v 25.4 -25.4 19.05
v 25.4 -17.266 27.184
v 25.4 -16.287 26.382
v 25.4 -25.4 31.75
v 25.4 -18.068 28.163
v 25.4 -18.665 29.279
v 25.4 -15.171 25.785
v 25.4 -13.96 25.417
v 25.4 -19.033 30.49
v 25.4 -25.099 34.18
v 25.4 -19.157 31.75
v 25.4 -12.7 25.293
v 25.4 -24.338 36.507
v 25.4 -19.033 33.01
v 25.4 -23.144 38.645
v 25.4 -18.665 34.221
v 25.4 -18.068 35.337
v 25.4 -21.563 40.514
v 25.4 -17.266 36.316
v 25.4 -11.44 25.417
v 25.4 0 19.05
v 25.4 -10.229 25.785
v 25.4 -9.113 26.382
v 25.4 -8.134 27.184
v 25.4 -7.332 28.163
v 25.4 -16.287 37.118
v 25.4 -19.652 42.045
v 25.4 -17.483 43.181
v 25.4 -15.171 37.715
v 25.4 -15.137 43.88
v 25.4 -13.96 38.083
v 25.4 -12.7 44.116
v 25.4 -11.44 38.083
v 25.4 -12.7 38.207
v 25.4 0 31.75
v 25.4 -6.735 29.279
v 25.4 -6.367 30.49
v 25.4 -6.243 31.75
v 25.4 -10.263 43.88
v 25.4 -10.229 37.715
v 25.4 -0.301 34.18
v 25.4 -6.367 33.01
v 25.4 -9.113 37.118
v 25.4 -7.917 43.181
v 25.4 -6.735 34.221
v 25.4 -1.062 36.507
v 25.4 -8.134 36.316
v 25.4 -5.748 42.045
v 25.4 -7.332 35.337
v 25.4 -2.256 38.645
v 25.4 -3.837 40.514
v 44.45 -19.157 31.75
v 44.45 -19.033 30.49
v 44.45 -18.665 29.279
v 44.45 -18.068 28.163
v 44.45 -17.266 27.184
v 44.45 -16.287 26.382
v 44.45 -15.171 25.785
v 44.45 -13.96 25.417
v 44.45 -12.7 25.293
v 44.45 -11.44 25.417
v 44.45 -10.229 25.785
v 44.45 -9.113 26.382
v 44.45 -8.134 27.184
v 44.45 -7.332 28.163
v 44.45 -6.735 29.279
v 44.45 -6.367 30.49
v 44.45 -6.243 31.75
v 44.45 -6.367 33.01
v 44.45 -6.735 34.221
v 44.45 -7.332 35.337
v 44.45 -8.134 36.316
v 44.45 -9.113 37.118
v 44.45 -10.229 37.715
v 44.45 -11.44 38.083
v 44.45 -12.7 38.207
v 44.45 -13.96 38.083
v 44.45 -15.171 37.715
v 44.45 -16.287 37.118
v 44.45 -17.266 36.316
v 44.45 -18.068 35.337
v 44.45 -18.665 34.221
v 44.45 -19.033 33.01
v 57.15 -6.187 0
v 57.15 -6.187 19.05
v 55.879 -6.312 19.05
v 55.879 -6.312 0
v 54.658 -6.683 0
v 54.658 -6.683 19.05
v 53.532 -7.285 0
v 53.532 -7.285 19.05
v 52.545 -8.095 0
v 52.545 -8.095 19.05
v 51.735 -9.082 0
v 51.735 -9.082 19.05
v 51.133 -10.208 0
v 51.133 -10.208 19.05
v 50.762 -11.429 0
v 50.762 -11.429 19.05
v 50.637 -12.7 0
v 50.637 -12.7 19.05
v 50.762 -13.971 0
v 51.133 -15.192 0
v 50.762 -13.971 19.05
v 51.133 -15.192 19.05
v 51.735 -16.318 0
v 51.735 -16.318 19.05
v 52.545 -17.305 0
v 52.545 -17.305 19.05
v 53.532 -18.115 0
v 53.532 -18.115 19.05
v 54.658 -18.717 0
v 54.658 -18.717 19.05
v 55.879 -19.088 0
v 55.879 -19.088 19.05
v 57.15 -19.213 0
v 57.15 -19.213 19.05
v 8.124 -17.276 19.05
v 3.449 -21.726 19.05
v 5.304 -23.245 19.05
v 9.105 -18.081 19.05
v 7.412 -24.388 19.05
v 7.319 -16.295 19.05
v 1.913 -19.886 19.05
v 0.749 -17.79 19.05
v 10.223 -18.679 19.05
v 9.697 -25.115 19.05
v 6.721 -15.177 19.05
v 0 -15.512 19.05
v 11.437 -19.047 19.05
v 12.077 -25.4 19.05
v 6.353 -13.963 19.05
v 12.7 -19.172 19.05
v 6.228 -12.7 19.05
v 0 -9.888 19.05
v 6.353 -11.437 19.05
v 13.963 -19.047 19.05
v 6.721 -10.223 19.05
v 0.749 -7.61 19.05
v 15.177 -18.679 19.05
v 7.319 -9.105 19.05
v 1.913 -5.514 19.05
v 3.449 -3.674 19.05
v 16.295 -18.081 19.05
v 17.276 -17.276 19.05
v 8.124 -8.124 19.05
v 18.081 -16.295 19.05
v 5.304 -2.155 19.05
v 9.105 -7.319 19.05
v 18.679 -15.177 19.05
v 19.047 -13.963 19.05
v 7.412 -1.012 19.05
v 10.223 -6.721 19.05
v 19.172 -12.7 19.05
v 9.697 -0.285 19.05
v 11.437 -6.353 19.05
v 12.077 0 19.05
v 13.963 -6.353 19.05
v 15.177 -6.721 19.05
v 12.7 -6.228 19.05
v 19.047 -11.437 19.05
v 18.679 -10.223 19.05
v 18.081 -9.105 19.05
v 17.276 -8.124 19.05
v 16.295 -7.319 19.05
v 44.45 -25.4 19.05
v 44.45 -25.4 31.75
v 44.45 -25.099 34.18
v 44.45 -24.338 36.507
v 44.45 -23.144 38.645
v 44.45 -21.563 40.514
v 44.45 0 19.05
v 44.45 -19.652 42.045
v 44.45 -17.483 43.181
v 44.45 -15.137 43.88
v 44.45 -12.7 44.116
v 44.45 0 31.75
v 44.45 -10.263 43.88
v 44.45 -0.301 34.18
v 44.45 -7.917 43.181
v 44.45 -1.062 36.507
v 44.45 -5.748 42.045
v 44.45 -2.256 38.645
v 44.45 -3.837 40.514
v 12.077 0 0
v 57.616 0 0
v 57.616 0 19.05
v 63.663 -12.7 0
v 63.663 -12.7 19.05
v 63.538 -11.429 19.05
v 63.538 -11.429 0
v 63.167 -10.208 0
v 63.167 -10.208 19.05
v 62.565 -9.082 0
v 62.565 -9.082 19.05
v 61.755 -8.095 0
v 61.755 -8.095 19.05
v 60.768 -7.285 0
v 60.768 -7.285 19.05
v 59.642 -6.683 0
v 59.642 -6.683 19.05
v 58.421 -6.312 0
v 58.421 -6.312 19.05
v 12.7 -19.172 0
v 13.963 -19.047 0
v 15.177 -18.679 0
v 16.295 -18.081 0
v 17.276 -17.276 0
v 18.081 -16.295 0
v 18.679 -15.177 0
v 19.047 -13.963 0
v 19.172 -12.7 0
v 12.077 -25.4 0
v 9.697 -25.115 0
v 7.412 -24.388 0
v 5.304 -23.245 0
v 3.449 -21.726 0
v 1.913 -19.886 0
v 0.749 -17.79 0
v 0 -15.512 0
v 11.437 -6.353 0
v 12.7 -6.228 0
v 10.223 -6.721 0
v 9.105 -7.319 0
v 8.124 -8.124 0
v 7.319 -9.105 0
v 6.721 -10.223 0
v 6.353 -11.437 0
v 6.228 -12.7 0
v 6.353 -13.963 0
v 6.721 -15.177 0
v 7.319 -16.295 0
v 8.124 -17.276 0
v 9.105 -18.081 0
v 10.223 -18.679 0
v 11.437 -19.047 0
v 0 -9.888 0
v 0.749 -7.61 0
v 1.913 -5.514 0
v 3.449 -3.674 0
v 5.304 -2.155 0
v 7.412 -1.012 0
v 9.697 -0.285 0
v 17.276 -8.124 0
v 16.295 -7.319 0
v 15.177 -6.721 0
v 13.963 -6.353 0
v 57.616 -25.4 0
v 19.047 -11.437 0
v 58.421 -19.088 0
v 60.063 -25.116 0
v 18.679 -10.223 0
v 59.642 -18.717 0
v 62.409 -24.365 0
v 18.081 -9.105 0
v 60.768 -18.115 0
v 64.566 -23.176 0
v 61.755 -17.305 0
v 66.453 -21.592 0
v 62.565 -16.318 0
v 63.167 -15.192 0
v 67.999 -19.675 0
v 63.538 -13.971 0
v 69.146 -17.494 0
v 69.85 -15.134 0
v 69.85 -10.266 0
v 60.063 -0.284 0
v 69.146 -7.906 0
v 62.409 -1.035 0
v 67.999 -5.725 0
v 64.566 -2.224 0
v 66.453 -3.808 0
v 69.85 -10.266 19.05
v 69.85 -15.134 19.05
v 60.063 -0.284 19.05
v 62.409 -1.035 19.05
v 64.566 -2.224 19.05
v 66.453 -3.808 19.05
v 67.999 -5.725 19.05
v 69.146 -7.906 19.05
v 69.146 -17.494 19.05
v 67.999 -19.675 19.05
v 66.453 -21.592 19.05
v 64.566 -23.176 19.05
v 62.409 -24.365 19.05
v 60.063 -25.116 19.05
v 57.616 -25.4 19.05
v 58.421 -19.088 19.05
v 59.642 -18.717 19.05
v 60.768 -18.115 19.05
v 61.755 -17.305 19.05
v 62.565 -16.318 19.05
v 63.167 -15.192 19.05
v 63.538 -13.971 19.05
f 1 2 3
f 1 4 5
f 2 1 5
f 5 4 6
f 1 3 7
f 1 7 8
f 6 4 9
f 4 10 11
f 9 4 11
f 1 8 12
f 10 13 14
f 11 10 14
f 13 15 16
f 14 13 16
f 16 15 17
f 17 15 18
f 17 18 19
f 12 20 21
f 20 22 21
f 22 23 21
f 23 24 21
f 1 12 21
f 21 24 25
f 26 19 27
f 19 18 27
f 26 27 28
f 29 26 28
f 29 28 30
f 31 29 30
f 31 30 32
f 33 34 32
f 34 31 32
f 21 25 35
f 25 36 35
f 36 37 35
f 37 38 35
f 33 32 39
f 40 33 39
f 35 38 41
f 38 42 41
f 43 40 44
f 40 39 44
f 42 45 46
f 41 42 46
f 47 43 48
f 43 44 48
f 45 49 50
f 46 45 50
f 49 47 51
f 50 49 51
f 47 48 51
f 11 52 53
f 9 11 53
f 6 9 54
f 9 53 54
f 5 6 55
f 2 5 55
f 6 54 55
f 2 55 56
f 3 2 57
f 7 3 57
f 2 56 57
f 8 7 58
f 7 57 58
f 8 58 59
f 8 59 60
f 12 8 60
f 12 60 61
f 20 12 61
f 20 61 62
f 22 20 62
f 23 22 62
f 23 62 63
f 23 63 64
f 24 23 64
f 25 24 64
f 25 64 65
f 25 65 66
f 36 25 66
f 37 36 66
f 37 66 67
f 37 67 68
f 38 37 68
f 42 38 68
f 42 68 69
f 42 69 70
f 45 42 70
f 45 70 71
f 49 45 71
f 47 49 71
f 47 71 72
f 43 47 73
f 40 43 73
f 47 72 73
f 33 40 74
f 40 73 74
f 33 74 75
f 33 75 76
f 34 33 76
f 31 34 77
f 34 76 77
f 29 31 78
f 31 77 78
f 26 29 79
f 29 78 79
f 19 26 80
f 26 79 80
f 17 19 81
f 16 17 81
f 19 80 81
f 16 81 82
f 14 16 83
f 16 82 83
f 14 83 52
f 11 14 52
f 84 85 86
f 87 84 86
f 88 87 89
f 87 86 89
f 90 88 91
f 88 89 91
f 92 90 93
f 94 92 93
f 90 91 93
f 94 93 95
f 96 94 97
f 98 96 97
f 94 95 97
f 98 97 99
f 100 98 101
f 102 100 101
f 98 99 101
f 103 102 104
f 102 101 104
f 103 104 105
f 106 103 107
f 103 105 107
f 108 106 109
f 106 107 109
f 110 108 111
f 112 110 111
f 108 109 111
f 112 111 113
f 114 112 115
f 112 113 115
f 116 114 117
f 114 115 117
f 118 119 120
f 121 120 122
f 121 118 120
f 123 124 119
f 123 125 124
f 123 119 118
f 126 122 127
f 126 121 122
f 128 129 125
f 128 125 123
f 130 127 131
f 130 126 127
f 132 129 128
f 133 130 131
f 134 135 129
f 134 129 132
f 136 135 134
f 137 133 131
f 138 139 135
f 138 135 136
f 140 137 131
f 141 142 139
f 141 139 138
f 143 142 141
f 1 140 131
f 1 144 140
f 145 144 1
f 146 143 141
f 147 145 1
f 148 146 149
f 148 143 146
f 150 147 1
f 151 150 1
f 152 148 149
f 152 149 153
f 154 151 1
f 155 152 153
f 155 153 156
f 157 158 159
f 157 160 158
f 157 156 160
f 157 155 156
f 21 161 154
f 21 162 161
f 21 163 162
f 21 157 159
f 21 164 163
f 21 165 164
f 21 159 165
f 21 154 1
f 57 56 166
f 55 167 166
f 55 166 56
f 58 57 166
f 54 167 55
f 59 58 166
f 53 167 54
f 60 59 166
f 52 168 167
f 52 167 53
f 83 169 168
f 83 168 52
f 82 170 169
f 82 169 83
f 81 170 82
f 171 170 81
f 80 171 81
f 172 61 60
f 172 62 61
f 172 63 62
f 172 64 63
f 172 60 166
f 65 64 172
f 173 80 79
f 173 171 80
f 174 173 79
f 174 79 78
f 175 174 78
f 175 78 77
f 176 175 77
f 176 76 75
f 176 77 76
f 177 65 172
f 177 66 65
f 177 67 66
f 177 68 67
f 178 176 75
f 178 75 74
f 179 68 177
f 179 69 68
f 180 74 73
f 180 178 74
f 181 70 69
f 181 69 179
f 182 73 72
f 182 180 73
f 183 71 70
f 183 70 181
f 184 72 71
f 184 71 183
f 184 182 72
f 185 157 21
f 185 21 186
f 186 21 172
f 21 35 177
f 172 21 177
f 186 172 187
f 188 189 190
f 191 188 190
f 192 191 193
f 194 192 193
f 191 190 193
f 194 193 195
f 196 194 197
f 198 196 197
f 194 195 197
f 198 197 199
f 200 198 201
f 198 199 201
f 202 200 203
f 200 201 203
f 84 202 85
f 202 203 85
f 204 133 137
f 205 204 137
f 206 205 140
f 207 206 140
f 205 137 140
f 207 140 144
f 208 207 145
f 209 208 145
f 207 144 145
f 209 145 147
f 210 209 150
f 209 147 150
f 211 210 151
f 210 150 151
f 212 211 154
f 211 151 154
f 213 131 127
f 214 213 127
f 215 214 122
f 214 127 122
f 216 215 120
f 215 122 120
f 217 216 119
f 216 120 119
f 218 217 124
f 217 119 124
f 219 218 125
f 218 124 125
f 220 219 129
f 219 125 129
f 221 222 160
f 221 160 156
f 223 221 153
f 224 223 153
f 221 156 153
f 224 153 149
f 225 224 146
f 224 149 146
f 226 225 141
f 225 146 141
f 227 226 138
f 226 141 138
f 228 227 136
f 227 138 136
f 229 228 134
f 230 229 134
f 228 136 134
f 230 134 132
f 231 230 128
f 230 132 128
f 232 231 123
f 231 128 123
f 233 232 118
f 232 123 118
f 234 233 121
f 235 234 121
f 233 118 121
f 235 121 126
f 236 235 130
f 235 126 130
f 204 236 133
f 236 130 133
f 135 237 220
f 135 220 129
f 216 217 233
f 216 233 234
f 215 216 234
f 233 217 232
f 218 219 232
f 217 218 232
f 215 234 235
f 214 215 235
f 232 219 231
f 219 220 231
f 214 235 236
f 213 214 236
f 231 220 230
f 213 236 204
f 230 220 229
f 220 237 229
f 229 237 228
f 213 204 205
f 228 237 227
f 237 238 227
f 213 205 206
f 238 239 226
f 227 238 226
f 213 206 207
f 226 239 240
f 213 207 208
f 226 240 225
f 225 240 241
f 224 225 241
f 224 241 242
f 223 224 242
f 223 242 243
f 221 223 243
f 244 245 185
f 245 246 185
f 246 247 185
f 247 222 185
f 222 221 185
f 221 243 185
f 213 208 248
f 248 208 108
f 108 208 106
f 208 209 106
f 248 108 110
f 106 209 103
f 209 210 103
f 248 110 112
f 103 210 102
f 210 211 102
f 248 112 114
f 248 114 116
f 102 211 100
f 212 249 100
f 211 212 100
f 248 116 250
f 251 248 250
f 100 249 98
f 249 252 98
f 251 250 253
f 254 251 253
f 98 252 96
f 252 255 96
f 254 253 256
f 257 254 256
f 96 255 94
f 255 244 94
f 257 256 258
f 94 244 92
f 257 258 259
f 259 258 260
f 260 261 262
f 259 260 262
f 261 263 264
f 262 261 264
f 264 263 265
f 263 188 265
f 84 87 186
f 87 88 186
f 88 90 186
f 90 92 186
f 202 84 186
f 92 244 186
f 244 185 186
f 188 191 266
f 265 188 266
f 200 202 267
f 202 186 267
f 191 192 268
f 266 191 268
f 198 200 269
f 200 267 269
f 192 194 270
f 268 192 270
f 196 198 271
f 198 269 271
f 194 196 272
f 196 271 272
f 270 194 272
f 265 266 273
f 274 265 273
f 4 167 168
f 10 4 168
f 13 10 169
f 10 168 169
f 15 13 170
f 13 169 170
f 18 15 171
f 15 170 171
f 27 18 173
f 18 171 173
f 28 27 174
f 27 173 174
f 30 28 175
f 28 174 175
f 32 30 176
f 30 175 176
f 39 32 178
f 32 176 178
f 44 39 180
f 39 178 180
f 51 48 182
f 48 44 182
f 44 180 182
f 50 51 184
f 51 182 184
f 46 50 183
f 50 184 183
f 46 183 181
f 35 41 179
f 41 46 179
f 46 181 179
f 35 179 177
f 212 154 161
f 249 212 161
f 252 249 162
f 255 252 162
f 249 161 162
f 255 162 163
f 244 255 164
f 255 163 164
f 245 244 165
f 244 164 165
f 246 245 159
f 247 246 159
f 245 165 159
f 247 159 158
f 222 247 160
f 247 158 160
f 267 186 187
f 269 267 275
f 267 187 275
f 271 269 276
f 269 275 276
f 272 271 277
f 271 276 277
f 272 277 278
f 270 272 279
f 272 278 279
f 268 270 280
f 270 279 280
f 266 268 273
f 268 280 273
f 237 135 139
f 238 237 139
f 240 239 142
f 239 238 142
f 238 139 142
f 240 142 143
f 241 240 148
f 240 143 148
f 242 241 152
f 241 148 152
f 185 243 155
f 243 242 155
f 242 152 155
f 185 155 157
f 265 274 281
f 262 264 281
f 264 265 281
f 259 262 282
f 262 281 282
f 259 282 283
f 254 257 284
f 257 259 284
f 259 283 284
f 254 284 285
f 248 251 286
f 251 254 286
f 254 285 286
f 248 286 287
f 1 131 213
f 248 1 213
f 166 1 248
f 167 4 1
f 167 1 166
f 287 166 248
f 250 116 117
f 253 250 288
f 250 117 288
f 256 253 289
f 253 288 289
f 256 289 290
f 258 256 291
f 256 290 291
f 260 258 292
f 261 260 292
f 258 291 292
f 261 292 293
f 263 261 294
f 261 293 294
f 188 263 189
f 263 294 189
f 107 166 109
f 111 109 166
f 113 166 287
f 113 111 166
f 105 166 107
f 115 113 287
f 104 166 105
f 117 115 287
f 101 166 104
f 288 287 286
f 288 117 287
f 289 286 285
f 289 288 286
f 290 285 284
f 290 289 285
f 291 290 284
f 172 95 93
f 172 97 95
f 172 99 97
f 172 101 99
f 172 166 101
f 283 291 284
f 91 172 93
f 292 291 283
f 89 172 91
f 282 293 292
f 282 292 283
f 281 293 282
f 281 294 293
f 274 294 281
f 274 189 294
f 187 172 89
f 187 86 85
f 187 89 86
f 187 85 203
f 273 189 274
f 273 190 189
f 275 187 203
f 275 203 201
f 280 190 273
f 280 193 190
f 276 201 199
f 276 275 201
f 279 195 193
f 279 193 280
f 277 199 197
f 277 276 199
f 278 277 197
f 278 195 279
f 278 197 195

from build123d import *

# Parameters (mm, degrees)
F0_W     = 69.85
F0_H     = 44.45
F1_DEPTH = 25.4
F2_W     = 25.4
F2_H     = 25.4
F3_DEPTH = 25.4
F5_DEPTH = 25.4
F7_DEPTH = 25.4
F9_DEPTH = 44.451


with BuildPart() as f1:
    # F0 (on Front) → F1 (new body)
    with BuildSketch(Plane.XZ):
        with Locations((34.925, 22.225)):
            Rectangle(F0_W, F0_H)
    extrude(amount=F1_DEPTH)

    # F2 (on face) → F3 (cut)
    with BuildSketch(Plane.XY.offset(44.45)):
        with Locations((12.7, -12.7)):
            Rectangle(F2_W, F2_H)
        with Locations((57.15, -12.7)):
            Rectangle(F2_W, F2_H)
    extrude(amount=-F3_DEPTH, mode=Mode.SUBTRACT)

    # F4 (on face) → F5 (cut)
    with BuildSketch(Plane.XY.offset(19.05)):
        with BuildLine():
            ThreePointArc((19.1716522932, -12.7), (17.276149222, -8.123850778), (12.7, -6.2283477068))
            Line((12.7, -6.2283477068), (12.7, -19.1716522932))
            ThreePointArc((12.7, -19.1716522932), (17.276149222, -17.276149222), (19.1716522932, -12.7))
        make_face()
        with BuildLine():
            Line((12.7, -19.1716522932), (12.7, -6.2283477068))
            ThreePointArc((12.7, -6.2283477068), (6.2283477068, -12.7), (12.7, -19.1716522932))
        make_face()
        with BuildLine():
            ThreePointArc((0, -9.8877794327), (4.3409961707, -2.8703305999), (12.0772768095, 0))
            Line((12.0772768095, 0), (0, 0))
            Line((0, 0), (0, -9.8877794327))
        make_face()
        with BuildLine():
            ThreePointArc((12.0772768095, -25.4), (4.3409961707, -22.5296694001), (0, -15.5122205673))
            Line((0, -15.5122205673), (0, -25.4))
            Line((0, -25.4), (12.0772768095, -25.4))
        make_face()
    extrude(amount=-F5_DEPTH, mode=Mode.SUBTRACT)

    # F6 (on face) → F7 (cut)
    with BuildSketch(Plane.XY.offset(19.05)):
        with BuildLine():
            Line((57.15, -19.2128030993), (57.15, -6.1871969007))
            ThreePointArc((57.15, -6.1871969007), (50.6371969007, -12.7), (57.15, -19.2128030993))
        make_face()
        with BuildLine():
            ThreePointArc((63.6628030993, -12.7), (61.7552472361, -8.0947527639), (57.15, -6.1871969007))
            Line((57.15, -6.1871969007), (57.15, -19.2128030993))
            ThreePointArc((57.15, -19.2128030993), (61.7552472361, -17.3052472361), (63.6628030993, -12.7))
        make_face()
        with BuildLine():
            Line((69.85, 0), (57.6164578164, 0))
            ThreePointArc((57.6164578164, 0), (65.5484324783, -2.9699513679), (69.85, -10.2660702007))
            Line((69.85, -10.2660702007), (69.85, 0))
        make_face()
        with BuildLine():
            Line((69.85, -25.4), (69.85, -15.1339297993))
            ThreePointArc((69.85, -15.1339297993), (65.5484324783, -22.4300486321), (57.6164578164, -25.4))
            Line((57.6164578164, -25.4), (69.85, -25.4))
        make_face()
    extrude(amount=-F7_DEPTH, mode=Mode.SUBTRACT)

    # F8 (on face) → F9 (cut, through all)
    with BuildSketch(Plane.YZ.offset(44.45)):
        with BuildLine():
            Line((-19.156636307, 31.75), (-6.243363693, 31.75))
            ThreePointArc((-6.243363693, 31.75), (-12.7, 38.206636307), (-19.156636307, 31.75))
        make_face()
        with BuildLine():
            ThreePointArc((-19.156636307, 31.75), (-12.7, 25.293363693), (-6.243363693, 31.75))
            Line((-6.243363693, 31.75), (-19.156636307, 31.75))
        make_face()
        with BuildLine():
            ThreePointArc((-25.4, 31.75), (-12.7, 44.1159367091), (0, 31.75))
            Line((0, 31.75), (0, 44.45))
            Line((0, 44.45), (-25.4, 44.45))
            Line((-25.4, 44.45), (-25.4, 31.75))
        make_face()
    extrude(amount=-F9_DEPTH, mode=Mode.SUBTRACT)


solid = f1.part
